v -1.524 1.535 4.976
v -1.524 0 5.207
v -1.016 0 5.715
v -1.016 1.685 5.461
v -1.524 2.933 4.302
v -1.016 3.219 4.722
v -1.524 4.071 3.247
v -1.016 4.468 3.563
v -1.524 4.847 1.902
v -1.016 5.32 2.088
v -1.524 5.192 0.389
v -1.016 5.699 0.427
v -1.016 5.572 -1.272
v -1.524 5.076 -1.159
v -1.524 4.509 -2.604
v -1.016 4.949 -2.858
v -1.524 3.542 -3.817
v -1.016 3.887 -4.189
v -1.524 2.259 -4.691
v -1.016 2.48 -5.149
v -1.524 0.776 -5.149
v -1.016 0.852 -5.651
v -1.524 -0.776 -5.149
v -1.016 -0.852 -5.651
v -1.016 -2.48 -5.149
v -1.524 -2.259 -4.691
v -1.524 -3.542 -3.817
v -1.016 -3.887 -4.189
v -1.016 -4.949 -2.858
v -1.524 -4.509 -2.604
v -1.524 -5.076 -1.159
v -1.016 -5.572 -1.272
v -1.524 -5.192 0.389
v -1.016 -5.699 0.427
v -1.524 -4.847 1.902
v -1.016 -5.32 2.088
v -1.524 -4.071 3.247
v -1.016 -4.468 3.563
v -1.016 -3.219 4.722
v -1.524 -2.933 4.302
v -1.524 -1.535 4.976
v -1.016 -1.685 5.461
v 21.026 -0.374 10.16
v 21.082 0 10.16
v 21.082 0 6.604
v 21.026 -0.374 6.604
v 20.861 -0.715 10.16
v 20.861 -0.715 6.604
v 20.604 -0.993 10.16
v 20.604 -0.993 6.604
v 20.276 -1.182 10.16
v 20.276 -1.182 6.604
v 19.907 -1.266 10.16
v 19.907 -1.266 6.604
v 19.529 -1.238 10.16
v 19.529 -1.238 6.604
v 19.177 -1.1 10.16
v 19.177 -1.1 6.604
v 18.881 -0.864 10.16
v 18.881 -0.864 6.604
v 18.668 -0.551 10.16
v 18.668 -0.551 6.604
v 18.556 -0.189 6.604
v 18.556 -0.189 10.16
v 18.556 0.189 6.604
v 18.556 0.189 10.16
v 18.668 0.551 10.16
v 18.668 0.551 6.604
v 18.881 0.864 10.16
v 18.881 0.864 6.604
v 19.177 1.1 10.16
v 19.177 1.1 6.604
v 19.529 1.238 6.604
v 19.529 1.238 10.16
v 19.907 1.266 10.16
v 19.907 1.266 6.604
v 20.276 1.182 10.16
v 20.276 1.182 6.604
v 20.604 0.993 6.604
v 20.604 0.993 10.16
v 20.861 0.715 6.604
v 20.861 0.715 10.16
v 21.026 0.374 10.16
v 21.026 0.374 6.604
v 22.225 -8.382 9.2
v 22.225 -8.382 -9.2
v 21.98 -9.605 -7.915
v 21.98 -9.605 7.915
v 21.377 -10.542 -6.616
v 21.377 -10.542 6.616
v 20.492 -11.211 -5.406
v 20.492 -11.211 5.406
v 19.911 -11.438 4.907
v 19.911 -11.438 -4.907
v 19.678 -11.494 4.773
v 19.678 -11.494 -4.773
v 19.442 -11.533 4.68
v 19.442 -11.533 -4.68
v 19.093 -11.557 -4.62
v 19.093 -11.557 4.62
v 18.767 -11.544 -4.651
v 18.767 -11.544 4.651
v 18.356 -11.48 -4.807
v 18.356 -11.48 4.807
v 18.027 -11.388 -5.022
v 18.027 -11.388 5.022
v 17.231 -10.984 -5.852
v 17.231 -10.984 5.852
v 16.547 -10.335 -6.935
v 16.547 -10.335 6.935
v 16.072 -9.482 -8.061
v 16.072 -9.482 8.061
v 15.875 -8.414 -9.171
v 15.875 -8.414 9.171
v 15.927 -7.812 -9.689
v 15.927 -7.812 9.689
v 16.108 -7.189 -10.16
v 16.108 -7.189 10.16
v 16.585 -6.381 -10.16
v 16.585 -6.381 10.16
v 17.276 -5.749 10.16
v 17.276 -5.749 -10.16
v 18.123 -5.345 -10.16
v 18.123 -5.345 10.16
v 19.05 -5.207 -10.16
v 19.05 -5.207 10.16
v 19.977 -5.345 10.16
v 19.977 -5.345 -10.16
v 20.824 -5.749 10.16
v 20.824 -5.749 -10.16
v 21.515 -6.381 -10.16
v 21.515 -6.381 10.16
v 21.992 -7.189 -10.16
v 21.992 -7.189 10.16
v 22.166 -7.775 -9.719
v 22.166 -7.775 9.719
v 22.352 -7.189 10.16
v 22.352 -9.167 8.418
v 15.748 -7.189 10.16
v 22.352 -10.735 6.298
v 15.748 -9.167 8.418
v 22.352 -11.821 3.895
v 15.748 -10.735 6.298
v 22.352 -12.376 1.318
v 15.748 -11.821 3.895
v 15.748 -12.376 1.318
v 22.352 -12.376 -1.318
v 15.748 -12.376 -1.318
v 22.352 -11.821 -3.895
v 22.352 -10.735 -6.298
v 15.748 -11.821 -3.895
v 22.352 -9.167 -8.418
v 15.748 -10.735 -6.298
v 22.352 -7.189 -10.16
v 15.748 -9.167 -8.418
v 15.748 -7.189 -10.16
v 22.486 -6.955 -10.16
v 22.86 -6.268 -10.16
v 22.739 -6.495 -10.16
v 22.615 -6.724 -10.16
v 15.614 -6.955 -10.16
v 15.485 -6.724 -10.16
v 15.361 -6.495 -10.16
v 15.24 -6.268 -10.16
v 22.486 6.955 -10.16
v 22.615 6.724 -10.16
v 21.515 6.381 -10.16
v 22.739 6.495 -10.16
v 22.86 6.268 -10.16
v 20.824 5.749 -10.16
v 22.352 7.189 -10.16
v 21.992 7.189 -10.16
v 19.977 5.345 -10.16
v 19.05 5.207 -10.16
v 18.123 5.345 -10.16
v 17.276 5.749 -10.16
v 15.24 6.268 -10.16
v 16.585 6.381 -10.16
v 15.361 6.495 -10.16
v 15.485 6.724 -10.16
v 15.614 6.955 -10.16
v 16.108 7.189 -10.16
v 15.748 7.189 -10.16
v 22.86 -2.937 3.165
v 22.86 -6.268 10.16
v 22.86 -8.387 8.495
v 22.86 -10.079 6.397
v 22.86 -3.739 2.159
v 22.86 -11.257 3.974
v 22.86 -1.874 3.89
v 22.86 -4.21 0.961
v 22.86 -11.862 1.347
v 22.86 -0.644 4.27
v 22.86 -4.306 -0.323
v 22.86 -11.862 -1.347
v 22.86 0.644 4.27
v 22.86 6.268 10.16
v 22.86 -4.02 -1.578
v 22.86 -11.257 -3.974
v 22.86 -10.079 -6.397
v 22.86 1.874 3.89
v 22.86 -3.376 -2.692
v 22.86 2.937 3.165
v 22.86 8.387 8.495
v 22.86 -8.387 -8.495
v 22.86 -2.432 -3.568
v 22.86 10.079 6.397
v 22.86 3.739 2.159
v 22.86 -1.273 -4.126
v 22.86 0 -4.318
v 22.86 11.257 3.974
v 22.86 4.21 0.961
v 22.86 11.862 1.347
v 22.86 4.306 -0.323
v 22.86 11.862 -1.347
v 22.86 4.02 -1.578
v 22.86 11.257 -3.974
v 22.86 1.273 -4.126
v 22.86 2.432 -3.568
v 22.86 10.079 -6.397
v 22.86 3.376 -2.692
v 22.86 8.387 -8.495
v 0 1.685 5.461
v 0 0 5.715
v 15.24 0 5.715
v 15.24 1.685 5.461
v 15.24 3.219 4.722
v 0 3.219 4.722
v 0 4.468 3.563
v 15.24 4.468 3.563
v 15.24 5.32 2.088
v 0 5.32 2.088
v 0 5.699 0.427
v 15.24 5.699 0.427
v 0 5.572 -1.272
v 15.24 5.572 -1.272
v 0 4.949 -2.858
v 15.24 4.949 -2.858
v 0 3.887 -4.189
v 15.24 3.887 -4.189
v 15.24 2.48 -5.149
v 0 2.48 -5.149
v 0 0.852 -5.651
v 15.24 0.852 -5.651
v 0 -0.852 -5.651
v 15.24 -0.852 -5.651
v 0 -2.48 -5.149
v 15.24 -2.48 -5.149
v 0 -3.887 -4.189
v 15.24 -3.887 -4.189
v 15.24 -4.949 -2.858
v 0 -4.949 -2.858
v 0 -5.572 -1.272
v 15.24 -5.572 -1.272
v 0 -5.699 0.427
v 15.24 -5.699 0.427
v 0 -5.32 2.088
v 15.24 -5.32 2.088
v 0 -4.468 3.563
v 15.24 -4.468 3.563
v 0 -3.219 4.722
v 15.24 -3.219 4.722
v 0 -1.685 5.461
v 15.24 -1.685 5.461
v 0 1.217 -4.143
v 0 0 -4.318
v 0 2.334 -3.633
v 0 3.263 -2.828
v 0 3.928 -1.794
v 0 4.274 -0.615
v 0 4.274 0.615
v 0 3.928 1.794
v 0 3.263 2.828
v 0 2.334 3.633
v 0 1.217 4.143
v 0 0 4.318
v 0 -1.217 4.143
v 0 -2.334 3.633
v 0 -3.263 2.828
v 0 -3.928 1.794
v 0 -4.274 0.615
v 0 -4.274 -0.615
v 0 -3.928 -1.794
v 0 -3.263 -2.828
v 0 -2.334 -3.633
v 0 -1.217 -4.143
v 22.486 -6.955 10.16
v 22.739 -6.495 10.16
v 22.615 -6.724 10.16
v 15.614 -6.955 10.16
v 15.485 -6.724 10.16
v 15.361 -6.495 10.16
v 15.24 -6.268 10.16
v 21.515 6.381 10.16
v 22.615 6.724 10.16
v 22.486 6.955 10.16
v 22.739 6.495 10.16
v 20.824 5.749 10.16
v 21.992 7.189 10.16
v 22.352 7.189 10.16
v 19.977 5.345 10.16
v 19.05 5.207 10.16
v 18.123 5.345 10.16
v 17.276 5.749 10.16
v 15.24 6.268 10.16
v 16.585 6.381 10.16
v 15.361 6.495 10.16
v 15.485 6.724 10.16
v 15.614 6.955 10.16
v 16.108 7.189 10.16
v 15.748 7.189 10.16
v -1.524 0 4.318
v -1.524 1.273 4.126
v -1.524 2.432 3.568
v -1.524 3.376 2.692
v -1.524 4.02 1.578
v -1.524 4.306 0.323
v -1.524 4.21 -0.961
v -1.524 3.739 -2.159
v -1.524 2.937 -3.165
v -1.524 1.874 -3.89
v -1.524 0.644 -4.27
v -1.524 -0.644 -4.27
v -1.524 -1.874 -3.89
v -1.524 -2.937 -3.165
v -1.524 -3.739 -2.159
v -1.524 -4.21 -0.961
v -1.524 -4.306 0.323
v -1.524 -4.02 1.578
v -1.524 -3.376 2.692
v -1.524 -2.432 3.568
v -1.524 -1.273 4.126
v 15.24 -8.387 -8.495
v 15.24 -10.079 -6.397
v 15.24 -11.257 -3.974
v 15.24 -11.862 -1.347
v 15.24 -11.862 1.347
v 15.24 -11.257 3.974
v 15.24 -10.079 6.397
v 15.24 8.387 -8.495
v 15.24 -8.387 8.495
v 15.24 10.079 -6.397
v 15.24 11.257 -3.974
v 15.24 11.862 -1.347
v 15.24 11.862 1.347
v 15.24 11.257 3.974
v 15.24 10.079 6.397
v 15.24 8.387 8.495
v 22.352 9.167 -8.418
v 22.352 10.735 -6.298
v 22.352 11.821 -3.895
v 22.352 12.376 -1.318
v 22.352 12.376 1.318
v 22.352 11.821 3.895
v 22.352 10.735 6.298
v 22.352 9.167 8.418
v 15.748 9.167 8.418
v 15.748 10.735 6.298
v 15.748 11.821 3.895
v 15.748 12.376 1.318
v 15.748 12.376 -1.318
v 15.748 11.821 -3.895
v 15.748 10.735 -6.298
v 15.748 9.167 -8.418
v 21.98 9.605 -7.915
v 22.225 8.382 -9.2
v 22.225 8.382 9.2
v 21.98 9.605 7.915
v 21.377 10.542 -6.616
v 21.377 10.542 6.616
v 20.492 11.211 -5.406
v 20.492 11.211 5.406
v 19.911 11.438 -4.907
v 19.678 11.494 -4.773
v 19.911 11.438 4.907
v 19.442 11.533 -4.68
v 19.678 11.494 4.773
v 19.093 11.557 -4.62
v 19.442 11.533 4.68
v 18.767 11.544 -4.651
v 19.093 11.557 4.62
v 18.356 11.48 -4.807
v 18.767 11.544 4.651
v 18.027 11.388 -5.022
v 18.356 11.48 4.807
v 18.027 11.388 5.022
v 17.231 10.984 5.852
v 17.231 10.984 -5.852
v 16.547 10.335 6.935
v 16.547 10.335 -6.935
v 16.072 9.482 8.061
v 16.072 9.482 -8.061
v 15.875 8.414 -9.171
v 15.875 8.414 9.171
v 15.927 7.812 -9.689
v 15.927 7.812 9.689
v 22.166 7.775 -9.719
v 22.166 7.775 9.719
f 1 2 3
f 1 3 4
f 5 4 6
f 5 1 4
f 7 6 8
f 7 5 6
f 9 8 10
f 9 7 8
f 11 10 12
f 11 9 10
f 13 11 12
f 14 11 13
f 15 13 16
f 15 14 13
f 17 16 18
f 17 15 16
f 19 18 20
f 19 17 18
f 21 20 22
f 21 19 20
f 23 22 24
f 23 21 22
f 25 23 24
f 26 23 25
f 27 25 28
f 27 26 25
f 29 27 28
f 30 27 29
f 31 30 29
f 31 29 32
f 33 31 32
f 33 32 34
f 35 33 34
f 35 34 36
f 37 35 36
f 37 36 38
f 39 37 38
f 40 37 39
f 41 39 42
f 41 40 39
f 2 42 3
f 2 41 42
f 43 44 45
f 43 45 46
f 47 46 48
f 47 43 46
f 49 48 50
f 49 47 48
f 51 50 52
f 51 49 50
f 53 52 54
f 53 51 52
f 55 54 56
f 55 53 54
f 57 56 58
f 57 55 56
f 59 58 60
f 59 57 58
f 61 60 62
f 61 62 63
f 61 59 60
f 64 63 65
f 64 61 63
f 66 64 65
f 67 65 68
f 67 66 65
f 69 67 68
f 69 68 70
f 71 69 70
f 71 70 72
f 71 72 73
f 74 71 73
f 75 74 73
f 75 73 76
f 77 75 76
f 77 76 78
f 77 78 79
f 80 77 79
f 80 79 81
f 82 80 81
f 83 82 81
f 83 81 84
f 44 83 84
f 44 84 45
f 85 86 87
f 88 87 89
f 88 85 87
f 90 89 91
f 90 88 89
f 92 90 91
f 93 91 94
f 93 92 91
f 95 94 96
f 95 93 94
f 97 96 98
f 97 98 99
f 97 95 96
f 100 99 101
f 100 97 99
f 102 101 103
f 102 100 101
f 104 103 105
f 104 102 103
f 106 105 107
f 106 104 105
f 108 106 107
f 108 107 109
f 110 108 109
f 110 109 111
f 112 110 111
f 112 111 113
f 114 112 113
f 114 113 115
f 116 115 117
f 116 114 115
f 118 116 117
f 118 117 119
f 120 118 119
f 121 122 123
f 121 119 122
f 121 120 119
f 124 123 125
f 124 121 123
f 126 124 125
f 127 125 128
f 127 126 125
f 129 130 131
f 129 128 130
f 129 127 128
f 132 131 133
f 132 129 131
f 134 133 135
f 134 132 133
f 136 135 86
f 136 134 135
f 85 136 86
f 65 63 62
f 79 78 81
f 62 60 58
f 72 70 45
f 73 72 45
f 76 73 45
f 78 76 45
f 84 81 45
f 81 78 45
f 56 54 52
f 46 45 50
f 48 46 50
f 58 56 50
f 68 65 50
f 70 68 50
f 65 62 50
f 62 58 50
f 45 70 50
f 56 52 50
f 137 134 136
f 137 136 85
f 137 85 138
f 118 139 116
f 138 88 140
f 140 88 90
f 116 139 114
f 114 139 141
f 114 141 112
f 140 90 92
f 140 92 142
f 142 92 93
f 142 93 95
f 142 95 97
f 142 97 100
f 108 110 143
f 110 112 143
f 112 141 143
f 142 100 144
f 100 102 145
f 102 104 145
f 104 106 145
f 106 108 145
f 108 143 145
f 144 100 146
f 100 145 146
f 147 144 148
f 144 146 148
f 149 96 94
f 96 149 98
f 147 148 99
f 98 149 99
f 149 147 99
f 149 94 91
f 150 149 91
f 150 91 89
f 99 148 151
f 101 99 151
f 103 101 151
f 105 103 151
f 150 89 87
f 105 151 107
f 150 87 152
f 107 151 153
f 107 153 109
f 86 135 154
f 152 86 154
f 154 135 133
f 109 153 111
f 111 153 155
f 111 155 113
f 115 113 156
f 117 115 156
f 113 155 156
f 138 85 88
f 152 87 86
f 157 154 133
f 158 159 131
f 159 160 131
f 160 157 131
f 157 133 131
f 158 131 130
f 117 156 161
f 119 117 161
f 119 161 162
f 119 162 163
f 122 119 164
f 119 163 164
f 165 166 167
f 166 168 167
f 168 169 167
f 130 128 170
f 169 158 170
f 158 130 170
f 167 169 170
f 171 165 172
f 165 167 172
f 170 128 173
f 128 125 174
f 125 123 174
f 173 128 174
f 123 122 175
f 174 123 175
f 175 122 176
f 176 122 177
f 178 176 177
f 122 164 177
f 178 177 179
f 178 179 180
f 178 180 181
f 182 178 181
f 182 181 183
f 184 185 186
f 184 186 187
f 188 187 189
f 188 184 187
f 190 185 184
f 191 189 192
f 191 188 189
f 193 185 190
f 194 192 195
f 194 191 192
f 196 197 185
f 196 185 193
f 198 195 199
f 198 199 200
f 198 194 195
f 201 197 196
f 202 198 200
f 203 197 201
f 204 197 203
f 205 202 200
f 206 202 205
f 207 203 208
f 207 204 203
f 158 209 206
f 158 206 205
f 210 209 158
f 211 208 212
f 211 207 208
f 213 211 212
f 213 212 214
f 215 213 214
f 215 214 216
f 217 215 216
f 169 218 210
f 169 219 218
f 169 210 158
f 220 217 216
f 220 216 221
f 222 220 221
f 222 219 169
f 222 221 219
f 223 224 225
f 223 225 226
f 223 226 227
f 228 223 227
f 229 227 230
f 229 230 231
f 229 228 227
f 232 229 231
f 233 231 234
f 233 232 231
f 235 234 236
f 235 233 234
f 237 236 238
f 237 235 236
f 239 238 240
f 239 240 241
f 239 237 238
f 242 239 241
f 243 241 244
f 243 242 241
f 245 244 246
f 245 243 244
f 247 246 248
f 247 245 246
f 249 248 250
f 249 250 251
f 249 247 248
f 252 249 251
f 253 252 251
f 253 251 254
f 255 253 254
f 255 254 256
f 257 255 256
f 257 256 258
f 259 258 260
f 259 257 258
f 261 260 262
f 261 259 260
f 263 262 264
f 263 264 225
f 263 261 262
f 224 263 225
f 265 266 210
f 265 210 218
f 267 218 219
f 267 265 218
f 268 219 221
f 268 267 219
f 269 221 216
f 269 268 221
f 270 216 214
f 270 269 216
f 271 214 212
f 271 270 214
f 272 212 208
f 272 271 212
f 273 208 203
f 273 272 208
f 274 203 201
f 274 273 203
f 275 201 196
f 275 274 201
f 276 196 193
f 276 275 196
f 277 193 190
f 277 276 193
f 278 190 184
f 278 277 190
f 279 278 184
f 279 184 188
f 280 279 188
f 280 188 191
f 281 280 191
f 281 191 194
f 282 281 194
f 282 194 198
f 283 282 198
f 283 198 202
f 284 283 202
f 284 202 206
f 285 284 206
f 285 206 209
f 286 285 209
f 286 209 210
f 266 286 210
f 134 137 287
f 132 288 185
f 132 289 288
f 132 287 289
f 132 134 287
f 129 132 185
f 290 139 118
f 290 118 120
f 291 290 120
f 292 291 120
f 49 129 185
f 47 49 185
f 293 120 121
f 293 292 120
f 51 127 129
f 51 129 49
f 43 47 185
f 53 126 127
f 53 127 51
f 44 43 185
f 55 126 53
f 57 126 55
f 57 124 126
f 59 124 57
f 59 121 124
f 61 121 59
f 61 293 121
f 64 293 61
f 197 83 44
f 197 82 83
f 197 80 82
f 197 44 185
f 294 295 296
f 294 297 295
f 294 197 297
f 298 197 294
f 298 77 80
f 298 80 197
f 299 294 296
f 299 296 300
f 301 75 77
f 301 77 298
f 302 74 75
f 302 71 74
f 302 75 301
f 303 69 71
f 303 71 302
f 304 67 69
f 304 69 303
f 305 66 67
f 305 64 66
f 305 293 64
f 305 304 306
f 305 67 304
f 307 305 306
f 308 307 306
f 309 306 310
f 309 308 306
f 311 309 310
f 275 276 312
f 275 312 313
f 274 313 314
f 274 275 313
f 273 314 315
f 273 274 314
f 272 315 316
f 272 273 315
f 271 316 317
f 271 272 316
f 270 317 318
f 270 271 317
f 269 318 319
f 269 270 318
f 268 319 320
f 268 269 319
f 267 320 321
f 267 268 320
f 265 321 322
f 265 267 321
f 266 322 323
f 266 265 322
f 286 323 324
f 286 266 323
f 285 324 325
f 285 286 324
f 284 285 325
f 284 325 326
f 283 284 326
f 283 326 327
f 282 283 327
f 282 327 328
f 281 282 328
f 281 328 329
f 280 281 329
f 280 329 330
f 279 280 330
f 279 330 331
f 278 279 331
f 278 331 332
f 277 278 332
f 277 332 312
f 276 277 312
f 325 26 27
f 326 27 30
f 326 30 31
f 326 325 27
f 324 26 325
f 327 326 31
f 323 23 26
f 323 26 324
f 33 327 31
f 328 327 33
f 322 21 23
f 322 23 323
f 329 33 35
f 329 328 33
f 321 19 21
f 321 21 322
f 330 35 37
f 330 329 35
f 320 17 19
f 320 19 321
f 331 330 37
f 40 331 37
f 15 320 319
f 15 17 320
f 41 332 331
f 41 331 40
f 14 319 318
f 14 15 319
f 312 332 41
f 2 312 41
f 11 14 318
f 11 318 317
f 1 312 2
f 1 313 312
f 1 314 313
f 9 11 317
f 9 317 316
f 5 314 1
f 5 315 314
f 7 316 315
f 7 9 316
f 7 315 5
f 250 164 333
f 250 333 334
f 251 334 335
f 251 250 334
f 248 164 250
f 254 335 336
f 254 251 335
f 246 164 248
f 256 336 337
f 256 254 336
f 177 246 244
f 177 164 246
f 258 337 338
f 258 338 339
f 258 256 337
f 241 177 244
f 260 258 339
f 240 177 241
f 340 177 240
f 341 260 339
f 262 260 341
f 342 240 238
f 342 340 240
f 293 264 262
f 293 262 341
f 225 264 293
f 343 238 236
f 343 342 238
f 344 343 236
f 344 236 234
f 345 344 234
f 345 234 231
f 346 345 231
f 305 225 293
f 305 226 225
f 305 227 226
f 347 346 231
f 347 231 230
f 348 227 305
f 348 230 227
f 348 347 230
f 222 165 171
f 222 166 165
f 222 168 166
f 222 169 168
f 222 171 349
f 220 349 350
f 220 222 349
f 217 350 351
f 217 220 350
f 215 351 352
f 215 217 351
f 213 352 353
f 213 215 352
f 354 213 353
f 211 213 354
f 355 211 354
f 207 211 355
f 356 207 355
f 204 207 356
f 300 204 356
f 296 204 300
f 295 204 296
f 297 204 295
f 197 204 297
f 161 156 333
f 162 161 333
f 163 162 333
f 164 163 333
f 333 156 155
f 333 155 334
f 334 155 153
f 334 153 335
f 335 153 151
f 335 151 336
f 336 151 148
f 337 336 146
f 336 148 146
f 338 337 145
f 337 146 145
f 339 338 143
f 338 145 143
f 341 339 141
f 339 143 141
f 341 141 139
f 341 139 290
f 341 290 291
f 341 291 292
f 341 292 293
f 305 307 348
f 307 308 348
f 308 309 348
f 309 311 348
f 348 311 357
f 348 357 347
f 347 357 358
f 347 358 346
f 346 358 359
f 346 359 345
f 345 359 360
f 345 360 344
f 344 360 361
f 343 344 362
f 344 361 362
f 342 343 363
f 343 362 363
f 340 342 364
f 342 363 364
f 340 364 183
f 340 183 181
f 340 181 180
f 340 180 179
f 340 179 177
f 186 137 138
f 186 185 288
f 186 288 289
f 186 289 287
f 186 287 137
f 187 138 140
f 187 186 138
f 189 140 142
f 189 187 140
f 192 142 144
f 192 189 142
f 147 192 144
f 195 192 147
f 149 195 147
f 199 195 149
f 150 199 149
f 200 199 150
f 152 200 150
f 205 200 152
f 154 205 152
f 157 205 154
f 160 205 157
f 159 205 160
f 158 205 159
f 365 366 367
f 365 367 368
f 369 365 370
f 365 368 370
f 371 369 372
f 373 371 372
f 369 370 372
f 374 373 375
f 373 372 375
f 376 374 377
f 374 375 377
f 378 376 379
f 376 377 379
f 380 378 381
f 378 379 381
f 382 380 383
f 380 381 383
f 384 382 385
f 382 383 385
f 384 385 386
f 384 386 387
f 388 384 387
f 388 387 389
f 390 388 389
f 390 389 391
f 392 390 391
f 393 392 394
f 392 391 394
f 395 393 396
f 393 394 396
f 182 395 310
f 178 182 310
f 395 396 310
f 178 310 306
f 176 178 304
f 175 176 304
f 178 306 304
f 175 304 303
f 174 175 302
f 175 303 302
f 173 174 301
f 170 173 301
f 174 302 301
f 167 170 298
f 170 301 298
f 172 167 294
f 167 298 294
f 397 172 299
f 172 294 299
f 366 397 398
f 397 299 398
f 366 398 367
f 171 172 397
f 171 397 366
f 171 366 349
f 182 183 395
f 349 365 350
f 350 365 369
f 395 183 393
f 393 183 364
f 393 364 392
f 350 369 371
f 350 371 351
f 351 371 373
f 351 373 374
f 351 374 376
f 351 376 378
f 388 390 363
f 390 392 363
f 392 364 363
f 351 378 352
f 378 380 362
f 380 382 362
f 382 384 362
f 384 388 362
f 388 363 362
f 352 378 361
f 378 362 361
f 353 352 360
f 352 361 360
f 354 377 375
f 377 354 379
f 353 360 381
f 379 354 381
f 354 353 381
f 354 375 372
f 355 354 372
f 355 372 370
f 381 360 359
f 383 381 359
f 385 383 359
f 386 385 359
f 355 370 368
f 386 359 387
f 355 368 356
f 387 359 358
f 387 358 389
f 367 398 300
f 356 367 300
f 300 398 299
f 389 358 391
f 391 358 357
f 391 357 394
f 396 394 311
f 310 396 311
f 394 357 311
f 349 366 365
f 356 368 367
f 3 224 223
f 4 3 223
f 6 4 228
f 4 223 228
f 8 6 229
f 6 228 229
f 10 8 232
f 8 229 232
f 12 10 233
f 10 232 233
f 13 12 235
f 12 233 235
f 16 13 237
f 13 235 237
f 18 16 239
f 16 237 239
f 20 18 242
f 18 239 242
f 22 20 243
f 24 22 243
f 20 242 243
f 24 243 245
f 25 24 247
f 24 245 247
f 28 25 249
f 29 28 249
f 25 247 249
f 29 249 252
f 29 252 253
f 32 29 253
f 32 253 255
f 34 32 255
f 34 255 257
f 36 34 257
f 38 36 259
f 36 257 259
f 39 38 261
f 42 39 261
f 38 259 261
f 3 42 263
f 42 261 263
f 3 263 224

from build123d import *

# Parameters (mm, degrees)
SKETCH1_R               = 12.446
SKETCH1_R_2             = 4.318
BOSS_EXTRUDE1_DEPTH     = 22.86
SKETCH2_R               = 3.175
CUT_EXTRUDE1_DEPTH      = 13.446
SKETCH4_R               = 25.4
SKETCH4_R_2             = 5.715
CUT_EXTRUDE3_DEPTH      = 15.24
SKETCH7_R               = 1.27
CUT_EXTRUDE4_DEPTH      = 5.334
CUT_EXTRUDE4_DEPTH_BACK = 1.5080001
SKETCH8_R               = 5.715
SKETCH8_R_2             = 4.318
BOSS_EXTRUDE2_DEPTH     = 1.524
CHAMFER1_SIZE           = 0.508
SKETCH9_R               = 23.611709968
SKETCH9_W               = 20.32
SKETCH9_H               = 32.6206423
CUT_EXTRUDE5_DEPTH      = 13.97


with BuildPart() as part:
    # Sketch1 → Boss-Extrude1 (new body)
    with BuildSketch(Plane(origin=(0, 0, 0), x_dir=(0, 0, -1), z_dir=(1, 0, 0))):
        Circle(SKETCH1_R)
        Circle(SKETCH1_R_2, mode=Mode.SUBTRACT)
    extrude(amount=BOSS_EXTRUDE1_DEPTH)

    # Sketch2 → Cut-Extrude1 (cut, symmetric)
    with BuildSketch(Plane.XY):
        with Locations((19.05, 8.382)):
            Circle(SKETCH2_R)
    cut_extrude1 = extrude(amount=CUT_EXTRUDE1_DEPTH, both=True, mode=Mode.SUBTRACT)

    # Mirror1: Cut-Extrude1 across plane
    add(cut_extrude1.mirror(Plane.ZX), mode=Mode.SUBTRACT)

    # Sketch4 → Cut-Extrude3 (cut)
    with BuildSketch(Plane.ZY):
        Circle(SKETCH4_R)
        Circle(SKETCH4_R_2, mode=Mode.SUBTRACT)
    extrude(amount=-CUT_EXTRUDE3_DEPTH, mode=Mode.SUBTRACT)

    # Sketch7 → Cut-Extrude4 (cut, two sides)
    with BuildSketch(Plane(origin=(0, 0, 11.938), x_dir=(1, 0, 0), z_dir=(0, 0, -1))) as cut_extrude4_sk:
        with Locations((19.812, 0)):
            Circle(SKETCH7_R)
    extrude(amount=CUT_EXTRUDE4_DEPTH, mode=Mode.SUBTRACT)
    extrude(cut_extrude4_sk.sketch, amount=-CUT_EXTRUDE4_DEPTH_BACK, mode=Mode.SUBTRACT)

    # Sketch8 → Boss-Extrude2 (add)
    with BuildSketch(Plane.ZY):
        Circle(SKETCH8_R)
        Circle(SKETCH8_R_2, mode=Mode.SUBTRACT)
    extrude(amount=BOSS_EXTRUDE2_DEPTH)

    # Chamfer1
    chamfer1_edges = [part.edges().sort_by_distance(p)[0] for p in [
        (15.24, 0, 12.446),
        (-1.524, 0, -5.715),
        (22.86, 0, 12.446),
    ]]
    chamfer(chamfer1_edges, length=CHAMFER1_SIZE)

    # Sketch9 → Cut-Extrude5 (cut)
    with BuildSketch(Plane.ZY.offset(-15.24)):
        Circle(SKETCH9_R)
        Rectangle(SKETCH9_W, SKETCH9_H, mode=Mode.SUBTRACT)
    extrude(amount=-CUT_EXTRUDE5_DEPTH, mode=Mode.SUBTRACT)


solid = part.part
